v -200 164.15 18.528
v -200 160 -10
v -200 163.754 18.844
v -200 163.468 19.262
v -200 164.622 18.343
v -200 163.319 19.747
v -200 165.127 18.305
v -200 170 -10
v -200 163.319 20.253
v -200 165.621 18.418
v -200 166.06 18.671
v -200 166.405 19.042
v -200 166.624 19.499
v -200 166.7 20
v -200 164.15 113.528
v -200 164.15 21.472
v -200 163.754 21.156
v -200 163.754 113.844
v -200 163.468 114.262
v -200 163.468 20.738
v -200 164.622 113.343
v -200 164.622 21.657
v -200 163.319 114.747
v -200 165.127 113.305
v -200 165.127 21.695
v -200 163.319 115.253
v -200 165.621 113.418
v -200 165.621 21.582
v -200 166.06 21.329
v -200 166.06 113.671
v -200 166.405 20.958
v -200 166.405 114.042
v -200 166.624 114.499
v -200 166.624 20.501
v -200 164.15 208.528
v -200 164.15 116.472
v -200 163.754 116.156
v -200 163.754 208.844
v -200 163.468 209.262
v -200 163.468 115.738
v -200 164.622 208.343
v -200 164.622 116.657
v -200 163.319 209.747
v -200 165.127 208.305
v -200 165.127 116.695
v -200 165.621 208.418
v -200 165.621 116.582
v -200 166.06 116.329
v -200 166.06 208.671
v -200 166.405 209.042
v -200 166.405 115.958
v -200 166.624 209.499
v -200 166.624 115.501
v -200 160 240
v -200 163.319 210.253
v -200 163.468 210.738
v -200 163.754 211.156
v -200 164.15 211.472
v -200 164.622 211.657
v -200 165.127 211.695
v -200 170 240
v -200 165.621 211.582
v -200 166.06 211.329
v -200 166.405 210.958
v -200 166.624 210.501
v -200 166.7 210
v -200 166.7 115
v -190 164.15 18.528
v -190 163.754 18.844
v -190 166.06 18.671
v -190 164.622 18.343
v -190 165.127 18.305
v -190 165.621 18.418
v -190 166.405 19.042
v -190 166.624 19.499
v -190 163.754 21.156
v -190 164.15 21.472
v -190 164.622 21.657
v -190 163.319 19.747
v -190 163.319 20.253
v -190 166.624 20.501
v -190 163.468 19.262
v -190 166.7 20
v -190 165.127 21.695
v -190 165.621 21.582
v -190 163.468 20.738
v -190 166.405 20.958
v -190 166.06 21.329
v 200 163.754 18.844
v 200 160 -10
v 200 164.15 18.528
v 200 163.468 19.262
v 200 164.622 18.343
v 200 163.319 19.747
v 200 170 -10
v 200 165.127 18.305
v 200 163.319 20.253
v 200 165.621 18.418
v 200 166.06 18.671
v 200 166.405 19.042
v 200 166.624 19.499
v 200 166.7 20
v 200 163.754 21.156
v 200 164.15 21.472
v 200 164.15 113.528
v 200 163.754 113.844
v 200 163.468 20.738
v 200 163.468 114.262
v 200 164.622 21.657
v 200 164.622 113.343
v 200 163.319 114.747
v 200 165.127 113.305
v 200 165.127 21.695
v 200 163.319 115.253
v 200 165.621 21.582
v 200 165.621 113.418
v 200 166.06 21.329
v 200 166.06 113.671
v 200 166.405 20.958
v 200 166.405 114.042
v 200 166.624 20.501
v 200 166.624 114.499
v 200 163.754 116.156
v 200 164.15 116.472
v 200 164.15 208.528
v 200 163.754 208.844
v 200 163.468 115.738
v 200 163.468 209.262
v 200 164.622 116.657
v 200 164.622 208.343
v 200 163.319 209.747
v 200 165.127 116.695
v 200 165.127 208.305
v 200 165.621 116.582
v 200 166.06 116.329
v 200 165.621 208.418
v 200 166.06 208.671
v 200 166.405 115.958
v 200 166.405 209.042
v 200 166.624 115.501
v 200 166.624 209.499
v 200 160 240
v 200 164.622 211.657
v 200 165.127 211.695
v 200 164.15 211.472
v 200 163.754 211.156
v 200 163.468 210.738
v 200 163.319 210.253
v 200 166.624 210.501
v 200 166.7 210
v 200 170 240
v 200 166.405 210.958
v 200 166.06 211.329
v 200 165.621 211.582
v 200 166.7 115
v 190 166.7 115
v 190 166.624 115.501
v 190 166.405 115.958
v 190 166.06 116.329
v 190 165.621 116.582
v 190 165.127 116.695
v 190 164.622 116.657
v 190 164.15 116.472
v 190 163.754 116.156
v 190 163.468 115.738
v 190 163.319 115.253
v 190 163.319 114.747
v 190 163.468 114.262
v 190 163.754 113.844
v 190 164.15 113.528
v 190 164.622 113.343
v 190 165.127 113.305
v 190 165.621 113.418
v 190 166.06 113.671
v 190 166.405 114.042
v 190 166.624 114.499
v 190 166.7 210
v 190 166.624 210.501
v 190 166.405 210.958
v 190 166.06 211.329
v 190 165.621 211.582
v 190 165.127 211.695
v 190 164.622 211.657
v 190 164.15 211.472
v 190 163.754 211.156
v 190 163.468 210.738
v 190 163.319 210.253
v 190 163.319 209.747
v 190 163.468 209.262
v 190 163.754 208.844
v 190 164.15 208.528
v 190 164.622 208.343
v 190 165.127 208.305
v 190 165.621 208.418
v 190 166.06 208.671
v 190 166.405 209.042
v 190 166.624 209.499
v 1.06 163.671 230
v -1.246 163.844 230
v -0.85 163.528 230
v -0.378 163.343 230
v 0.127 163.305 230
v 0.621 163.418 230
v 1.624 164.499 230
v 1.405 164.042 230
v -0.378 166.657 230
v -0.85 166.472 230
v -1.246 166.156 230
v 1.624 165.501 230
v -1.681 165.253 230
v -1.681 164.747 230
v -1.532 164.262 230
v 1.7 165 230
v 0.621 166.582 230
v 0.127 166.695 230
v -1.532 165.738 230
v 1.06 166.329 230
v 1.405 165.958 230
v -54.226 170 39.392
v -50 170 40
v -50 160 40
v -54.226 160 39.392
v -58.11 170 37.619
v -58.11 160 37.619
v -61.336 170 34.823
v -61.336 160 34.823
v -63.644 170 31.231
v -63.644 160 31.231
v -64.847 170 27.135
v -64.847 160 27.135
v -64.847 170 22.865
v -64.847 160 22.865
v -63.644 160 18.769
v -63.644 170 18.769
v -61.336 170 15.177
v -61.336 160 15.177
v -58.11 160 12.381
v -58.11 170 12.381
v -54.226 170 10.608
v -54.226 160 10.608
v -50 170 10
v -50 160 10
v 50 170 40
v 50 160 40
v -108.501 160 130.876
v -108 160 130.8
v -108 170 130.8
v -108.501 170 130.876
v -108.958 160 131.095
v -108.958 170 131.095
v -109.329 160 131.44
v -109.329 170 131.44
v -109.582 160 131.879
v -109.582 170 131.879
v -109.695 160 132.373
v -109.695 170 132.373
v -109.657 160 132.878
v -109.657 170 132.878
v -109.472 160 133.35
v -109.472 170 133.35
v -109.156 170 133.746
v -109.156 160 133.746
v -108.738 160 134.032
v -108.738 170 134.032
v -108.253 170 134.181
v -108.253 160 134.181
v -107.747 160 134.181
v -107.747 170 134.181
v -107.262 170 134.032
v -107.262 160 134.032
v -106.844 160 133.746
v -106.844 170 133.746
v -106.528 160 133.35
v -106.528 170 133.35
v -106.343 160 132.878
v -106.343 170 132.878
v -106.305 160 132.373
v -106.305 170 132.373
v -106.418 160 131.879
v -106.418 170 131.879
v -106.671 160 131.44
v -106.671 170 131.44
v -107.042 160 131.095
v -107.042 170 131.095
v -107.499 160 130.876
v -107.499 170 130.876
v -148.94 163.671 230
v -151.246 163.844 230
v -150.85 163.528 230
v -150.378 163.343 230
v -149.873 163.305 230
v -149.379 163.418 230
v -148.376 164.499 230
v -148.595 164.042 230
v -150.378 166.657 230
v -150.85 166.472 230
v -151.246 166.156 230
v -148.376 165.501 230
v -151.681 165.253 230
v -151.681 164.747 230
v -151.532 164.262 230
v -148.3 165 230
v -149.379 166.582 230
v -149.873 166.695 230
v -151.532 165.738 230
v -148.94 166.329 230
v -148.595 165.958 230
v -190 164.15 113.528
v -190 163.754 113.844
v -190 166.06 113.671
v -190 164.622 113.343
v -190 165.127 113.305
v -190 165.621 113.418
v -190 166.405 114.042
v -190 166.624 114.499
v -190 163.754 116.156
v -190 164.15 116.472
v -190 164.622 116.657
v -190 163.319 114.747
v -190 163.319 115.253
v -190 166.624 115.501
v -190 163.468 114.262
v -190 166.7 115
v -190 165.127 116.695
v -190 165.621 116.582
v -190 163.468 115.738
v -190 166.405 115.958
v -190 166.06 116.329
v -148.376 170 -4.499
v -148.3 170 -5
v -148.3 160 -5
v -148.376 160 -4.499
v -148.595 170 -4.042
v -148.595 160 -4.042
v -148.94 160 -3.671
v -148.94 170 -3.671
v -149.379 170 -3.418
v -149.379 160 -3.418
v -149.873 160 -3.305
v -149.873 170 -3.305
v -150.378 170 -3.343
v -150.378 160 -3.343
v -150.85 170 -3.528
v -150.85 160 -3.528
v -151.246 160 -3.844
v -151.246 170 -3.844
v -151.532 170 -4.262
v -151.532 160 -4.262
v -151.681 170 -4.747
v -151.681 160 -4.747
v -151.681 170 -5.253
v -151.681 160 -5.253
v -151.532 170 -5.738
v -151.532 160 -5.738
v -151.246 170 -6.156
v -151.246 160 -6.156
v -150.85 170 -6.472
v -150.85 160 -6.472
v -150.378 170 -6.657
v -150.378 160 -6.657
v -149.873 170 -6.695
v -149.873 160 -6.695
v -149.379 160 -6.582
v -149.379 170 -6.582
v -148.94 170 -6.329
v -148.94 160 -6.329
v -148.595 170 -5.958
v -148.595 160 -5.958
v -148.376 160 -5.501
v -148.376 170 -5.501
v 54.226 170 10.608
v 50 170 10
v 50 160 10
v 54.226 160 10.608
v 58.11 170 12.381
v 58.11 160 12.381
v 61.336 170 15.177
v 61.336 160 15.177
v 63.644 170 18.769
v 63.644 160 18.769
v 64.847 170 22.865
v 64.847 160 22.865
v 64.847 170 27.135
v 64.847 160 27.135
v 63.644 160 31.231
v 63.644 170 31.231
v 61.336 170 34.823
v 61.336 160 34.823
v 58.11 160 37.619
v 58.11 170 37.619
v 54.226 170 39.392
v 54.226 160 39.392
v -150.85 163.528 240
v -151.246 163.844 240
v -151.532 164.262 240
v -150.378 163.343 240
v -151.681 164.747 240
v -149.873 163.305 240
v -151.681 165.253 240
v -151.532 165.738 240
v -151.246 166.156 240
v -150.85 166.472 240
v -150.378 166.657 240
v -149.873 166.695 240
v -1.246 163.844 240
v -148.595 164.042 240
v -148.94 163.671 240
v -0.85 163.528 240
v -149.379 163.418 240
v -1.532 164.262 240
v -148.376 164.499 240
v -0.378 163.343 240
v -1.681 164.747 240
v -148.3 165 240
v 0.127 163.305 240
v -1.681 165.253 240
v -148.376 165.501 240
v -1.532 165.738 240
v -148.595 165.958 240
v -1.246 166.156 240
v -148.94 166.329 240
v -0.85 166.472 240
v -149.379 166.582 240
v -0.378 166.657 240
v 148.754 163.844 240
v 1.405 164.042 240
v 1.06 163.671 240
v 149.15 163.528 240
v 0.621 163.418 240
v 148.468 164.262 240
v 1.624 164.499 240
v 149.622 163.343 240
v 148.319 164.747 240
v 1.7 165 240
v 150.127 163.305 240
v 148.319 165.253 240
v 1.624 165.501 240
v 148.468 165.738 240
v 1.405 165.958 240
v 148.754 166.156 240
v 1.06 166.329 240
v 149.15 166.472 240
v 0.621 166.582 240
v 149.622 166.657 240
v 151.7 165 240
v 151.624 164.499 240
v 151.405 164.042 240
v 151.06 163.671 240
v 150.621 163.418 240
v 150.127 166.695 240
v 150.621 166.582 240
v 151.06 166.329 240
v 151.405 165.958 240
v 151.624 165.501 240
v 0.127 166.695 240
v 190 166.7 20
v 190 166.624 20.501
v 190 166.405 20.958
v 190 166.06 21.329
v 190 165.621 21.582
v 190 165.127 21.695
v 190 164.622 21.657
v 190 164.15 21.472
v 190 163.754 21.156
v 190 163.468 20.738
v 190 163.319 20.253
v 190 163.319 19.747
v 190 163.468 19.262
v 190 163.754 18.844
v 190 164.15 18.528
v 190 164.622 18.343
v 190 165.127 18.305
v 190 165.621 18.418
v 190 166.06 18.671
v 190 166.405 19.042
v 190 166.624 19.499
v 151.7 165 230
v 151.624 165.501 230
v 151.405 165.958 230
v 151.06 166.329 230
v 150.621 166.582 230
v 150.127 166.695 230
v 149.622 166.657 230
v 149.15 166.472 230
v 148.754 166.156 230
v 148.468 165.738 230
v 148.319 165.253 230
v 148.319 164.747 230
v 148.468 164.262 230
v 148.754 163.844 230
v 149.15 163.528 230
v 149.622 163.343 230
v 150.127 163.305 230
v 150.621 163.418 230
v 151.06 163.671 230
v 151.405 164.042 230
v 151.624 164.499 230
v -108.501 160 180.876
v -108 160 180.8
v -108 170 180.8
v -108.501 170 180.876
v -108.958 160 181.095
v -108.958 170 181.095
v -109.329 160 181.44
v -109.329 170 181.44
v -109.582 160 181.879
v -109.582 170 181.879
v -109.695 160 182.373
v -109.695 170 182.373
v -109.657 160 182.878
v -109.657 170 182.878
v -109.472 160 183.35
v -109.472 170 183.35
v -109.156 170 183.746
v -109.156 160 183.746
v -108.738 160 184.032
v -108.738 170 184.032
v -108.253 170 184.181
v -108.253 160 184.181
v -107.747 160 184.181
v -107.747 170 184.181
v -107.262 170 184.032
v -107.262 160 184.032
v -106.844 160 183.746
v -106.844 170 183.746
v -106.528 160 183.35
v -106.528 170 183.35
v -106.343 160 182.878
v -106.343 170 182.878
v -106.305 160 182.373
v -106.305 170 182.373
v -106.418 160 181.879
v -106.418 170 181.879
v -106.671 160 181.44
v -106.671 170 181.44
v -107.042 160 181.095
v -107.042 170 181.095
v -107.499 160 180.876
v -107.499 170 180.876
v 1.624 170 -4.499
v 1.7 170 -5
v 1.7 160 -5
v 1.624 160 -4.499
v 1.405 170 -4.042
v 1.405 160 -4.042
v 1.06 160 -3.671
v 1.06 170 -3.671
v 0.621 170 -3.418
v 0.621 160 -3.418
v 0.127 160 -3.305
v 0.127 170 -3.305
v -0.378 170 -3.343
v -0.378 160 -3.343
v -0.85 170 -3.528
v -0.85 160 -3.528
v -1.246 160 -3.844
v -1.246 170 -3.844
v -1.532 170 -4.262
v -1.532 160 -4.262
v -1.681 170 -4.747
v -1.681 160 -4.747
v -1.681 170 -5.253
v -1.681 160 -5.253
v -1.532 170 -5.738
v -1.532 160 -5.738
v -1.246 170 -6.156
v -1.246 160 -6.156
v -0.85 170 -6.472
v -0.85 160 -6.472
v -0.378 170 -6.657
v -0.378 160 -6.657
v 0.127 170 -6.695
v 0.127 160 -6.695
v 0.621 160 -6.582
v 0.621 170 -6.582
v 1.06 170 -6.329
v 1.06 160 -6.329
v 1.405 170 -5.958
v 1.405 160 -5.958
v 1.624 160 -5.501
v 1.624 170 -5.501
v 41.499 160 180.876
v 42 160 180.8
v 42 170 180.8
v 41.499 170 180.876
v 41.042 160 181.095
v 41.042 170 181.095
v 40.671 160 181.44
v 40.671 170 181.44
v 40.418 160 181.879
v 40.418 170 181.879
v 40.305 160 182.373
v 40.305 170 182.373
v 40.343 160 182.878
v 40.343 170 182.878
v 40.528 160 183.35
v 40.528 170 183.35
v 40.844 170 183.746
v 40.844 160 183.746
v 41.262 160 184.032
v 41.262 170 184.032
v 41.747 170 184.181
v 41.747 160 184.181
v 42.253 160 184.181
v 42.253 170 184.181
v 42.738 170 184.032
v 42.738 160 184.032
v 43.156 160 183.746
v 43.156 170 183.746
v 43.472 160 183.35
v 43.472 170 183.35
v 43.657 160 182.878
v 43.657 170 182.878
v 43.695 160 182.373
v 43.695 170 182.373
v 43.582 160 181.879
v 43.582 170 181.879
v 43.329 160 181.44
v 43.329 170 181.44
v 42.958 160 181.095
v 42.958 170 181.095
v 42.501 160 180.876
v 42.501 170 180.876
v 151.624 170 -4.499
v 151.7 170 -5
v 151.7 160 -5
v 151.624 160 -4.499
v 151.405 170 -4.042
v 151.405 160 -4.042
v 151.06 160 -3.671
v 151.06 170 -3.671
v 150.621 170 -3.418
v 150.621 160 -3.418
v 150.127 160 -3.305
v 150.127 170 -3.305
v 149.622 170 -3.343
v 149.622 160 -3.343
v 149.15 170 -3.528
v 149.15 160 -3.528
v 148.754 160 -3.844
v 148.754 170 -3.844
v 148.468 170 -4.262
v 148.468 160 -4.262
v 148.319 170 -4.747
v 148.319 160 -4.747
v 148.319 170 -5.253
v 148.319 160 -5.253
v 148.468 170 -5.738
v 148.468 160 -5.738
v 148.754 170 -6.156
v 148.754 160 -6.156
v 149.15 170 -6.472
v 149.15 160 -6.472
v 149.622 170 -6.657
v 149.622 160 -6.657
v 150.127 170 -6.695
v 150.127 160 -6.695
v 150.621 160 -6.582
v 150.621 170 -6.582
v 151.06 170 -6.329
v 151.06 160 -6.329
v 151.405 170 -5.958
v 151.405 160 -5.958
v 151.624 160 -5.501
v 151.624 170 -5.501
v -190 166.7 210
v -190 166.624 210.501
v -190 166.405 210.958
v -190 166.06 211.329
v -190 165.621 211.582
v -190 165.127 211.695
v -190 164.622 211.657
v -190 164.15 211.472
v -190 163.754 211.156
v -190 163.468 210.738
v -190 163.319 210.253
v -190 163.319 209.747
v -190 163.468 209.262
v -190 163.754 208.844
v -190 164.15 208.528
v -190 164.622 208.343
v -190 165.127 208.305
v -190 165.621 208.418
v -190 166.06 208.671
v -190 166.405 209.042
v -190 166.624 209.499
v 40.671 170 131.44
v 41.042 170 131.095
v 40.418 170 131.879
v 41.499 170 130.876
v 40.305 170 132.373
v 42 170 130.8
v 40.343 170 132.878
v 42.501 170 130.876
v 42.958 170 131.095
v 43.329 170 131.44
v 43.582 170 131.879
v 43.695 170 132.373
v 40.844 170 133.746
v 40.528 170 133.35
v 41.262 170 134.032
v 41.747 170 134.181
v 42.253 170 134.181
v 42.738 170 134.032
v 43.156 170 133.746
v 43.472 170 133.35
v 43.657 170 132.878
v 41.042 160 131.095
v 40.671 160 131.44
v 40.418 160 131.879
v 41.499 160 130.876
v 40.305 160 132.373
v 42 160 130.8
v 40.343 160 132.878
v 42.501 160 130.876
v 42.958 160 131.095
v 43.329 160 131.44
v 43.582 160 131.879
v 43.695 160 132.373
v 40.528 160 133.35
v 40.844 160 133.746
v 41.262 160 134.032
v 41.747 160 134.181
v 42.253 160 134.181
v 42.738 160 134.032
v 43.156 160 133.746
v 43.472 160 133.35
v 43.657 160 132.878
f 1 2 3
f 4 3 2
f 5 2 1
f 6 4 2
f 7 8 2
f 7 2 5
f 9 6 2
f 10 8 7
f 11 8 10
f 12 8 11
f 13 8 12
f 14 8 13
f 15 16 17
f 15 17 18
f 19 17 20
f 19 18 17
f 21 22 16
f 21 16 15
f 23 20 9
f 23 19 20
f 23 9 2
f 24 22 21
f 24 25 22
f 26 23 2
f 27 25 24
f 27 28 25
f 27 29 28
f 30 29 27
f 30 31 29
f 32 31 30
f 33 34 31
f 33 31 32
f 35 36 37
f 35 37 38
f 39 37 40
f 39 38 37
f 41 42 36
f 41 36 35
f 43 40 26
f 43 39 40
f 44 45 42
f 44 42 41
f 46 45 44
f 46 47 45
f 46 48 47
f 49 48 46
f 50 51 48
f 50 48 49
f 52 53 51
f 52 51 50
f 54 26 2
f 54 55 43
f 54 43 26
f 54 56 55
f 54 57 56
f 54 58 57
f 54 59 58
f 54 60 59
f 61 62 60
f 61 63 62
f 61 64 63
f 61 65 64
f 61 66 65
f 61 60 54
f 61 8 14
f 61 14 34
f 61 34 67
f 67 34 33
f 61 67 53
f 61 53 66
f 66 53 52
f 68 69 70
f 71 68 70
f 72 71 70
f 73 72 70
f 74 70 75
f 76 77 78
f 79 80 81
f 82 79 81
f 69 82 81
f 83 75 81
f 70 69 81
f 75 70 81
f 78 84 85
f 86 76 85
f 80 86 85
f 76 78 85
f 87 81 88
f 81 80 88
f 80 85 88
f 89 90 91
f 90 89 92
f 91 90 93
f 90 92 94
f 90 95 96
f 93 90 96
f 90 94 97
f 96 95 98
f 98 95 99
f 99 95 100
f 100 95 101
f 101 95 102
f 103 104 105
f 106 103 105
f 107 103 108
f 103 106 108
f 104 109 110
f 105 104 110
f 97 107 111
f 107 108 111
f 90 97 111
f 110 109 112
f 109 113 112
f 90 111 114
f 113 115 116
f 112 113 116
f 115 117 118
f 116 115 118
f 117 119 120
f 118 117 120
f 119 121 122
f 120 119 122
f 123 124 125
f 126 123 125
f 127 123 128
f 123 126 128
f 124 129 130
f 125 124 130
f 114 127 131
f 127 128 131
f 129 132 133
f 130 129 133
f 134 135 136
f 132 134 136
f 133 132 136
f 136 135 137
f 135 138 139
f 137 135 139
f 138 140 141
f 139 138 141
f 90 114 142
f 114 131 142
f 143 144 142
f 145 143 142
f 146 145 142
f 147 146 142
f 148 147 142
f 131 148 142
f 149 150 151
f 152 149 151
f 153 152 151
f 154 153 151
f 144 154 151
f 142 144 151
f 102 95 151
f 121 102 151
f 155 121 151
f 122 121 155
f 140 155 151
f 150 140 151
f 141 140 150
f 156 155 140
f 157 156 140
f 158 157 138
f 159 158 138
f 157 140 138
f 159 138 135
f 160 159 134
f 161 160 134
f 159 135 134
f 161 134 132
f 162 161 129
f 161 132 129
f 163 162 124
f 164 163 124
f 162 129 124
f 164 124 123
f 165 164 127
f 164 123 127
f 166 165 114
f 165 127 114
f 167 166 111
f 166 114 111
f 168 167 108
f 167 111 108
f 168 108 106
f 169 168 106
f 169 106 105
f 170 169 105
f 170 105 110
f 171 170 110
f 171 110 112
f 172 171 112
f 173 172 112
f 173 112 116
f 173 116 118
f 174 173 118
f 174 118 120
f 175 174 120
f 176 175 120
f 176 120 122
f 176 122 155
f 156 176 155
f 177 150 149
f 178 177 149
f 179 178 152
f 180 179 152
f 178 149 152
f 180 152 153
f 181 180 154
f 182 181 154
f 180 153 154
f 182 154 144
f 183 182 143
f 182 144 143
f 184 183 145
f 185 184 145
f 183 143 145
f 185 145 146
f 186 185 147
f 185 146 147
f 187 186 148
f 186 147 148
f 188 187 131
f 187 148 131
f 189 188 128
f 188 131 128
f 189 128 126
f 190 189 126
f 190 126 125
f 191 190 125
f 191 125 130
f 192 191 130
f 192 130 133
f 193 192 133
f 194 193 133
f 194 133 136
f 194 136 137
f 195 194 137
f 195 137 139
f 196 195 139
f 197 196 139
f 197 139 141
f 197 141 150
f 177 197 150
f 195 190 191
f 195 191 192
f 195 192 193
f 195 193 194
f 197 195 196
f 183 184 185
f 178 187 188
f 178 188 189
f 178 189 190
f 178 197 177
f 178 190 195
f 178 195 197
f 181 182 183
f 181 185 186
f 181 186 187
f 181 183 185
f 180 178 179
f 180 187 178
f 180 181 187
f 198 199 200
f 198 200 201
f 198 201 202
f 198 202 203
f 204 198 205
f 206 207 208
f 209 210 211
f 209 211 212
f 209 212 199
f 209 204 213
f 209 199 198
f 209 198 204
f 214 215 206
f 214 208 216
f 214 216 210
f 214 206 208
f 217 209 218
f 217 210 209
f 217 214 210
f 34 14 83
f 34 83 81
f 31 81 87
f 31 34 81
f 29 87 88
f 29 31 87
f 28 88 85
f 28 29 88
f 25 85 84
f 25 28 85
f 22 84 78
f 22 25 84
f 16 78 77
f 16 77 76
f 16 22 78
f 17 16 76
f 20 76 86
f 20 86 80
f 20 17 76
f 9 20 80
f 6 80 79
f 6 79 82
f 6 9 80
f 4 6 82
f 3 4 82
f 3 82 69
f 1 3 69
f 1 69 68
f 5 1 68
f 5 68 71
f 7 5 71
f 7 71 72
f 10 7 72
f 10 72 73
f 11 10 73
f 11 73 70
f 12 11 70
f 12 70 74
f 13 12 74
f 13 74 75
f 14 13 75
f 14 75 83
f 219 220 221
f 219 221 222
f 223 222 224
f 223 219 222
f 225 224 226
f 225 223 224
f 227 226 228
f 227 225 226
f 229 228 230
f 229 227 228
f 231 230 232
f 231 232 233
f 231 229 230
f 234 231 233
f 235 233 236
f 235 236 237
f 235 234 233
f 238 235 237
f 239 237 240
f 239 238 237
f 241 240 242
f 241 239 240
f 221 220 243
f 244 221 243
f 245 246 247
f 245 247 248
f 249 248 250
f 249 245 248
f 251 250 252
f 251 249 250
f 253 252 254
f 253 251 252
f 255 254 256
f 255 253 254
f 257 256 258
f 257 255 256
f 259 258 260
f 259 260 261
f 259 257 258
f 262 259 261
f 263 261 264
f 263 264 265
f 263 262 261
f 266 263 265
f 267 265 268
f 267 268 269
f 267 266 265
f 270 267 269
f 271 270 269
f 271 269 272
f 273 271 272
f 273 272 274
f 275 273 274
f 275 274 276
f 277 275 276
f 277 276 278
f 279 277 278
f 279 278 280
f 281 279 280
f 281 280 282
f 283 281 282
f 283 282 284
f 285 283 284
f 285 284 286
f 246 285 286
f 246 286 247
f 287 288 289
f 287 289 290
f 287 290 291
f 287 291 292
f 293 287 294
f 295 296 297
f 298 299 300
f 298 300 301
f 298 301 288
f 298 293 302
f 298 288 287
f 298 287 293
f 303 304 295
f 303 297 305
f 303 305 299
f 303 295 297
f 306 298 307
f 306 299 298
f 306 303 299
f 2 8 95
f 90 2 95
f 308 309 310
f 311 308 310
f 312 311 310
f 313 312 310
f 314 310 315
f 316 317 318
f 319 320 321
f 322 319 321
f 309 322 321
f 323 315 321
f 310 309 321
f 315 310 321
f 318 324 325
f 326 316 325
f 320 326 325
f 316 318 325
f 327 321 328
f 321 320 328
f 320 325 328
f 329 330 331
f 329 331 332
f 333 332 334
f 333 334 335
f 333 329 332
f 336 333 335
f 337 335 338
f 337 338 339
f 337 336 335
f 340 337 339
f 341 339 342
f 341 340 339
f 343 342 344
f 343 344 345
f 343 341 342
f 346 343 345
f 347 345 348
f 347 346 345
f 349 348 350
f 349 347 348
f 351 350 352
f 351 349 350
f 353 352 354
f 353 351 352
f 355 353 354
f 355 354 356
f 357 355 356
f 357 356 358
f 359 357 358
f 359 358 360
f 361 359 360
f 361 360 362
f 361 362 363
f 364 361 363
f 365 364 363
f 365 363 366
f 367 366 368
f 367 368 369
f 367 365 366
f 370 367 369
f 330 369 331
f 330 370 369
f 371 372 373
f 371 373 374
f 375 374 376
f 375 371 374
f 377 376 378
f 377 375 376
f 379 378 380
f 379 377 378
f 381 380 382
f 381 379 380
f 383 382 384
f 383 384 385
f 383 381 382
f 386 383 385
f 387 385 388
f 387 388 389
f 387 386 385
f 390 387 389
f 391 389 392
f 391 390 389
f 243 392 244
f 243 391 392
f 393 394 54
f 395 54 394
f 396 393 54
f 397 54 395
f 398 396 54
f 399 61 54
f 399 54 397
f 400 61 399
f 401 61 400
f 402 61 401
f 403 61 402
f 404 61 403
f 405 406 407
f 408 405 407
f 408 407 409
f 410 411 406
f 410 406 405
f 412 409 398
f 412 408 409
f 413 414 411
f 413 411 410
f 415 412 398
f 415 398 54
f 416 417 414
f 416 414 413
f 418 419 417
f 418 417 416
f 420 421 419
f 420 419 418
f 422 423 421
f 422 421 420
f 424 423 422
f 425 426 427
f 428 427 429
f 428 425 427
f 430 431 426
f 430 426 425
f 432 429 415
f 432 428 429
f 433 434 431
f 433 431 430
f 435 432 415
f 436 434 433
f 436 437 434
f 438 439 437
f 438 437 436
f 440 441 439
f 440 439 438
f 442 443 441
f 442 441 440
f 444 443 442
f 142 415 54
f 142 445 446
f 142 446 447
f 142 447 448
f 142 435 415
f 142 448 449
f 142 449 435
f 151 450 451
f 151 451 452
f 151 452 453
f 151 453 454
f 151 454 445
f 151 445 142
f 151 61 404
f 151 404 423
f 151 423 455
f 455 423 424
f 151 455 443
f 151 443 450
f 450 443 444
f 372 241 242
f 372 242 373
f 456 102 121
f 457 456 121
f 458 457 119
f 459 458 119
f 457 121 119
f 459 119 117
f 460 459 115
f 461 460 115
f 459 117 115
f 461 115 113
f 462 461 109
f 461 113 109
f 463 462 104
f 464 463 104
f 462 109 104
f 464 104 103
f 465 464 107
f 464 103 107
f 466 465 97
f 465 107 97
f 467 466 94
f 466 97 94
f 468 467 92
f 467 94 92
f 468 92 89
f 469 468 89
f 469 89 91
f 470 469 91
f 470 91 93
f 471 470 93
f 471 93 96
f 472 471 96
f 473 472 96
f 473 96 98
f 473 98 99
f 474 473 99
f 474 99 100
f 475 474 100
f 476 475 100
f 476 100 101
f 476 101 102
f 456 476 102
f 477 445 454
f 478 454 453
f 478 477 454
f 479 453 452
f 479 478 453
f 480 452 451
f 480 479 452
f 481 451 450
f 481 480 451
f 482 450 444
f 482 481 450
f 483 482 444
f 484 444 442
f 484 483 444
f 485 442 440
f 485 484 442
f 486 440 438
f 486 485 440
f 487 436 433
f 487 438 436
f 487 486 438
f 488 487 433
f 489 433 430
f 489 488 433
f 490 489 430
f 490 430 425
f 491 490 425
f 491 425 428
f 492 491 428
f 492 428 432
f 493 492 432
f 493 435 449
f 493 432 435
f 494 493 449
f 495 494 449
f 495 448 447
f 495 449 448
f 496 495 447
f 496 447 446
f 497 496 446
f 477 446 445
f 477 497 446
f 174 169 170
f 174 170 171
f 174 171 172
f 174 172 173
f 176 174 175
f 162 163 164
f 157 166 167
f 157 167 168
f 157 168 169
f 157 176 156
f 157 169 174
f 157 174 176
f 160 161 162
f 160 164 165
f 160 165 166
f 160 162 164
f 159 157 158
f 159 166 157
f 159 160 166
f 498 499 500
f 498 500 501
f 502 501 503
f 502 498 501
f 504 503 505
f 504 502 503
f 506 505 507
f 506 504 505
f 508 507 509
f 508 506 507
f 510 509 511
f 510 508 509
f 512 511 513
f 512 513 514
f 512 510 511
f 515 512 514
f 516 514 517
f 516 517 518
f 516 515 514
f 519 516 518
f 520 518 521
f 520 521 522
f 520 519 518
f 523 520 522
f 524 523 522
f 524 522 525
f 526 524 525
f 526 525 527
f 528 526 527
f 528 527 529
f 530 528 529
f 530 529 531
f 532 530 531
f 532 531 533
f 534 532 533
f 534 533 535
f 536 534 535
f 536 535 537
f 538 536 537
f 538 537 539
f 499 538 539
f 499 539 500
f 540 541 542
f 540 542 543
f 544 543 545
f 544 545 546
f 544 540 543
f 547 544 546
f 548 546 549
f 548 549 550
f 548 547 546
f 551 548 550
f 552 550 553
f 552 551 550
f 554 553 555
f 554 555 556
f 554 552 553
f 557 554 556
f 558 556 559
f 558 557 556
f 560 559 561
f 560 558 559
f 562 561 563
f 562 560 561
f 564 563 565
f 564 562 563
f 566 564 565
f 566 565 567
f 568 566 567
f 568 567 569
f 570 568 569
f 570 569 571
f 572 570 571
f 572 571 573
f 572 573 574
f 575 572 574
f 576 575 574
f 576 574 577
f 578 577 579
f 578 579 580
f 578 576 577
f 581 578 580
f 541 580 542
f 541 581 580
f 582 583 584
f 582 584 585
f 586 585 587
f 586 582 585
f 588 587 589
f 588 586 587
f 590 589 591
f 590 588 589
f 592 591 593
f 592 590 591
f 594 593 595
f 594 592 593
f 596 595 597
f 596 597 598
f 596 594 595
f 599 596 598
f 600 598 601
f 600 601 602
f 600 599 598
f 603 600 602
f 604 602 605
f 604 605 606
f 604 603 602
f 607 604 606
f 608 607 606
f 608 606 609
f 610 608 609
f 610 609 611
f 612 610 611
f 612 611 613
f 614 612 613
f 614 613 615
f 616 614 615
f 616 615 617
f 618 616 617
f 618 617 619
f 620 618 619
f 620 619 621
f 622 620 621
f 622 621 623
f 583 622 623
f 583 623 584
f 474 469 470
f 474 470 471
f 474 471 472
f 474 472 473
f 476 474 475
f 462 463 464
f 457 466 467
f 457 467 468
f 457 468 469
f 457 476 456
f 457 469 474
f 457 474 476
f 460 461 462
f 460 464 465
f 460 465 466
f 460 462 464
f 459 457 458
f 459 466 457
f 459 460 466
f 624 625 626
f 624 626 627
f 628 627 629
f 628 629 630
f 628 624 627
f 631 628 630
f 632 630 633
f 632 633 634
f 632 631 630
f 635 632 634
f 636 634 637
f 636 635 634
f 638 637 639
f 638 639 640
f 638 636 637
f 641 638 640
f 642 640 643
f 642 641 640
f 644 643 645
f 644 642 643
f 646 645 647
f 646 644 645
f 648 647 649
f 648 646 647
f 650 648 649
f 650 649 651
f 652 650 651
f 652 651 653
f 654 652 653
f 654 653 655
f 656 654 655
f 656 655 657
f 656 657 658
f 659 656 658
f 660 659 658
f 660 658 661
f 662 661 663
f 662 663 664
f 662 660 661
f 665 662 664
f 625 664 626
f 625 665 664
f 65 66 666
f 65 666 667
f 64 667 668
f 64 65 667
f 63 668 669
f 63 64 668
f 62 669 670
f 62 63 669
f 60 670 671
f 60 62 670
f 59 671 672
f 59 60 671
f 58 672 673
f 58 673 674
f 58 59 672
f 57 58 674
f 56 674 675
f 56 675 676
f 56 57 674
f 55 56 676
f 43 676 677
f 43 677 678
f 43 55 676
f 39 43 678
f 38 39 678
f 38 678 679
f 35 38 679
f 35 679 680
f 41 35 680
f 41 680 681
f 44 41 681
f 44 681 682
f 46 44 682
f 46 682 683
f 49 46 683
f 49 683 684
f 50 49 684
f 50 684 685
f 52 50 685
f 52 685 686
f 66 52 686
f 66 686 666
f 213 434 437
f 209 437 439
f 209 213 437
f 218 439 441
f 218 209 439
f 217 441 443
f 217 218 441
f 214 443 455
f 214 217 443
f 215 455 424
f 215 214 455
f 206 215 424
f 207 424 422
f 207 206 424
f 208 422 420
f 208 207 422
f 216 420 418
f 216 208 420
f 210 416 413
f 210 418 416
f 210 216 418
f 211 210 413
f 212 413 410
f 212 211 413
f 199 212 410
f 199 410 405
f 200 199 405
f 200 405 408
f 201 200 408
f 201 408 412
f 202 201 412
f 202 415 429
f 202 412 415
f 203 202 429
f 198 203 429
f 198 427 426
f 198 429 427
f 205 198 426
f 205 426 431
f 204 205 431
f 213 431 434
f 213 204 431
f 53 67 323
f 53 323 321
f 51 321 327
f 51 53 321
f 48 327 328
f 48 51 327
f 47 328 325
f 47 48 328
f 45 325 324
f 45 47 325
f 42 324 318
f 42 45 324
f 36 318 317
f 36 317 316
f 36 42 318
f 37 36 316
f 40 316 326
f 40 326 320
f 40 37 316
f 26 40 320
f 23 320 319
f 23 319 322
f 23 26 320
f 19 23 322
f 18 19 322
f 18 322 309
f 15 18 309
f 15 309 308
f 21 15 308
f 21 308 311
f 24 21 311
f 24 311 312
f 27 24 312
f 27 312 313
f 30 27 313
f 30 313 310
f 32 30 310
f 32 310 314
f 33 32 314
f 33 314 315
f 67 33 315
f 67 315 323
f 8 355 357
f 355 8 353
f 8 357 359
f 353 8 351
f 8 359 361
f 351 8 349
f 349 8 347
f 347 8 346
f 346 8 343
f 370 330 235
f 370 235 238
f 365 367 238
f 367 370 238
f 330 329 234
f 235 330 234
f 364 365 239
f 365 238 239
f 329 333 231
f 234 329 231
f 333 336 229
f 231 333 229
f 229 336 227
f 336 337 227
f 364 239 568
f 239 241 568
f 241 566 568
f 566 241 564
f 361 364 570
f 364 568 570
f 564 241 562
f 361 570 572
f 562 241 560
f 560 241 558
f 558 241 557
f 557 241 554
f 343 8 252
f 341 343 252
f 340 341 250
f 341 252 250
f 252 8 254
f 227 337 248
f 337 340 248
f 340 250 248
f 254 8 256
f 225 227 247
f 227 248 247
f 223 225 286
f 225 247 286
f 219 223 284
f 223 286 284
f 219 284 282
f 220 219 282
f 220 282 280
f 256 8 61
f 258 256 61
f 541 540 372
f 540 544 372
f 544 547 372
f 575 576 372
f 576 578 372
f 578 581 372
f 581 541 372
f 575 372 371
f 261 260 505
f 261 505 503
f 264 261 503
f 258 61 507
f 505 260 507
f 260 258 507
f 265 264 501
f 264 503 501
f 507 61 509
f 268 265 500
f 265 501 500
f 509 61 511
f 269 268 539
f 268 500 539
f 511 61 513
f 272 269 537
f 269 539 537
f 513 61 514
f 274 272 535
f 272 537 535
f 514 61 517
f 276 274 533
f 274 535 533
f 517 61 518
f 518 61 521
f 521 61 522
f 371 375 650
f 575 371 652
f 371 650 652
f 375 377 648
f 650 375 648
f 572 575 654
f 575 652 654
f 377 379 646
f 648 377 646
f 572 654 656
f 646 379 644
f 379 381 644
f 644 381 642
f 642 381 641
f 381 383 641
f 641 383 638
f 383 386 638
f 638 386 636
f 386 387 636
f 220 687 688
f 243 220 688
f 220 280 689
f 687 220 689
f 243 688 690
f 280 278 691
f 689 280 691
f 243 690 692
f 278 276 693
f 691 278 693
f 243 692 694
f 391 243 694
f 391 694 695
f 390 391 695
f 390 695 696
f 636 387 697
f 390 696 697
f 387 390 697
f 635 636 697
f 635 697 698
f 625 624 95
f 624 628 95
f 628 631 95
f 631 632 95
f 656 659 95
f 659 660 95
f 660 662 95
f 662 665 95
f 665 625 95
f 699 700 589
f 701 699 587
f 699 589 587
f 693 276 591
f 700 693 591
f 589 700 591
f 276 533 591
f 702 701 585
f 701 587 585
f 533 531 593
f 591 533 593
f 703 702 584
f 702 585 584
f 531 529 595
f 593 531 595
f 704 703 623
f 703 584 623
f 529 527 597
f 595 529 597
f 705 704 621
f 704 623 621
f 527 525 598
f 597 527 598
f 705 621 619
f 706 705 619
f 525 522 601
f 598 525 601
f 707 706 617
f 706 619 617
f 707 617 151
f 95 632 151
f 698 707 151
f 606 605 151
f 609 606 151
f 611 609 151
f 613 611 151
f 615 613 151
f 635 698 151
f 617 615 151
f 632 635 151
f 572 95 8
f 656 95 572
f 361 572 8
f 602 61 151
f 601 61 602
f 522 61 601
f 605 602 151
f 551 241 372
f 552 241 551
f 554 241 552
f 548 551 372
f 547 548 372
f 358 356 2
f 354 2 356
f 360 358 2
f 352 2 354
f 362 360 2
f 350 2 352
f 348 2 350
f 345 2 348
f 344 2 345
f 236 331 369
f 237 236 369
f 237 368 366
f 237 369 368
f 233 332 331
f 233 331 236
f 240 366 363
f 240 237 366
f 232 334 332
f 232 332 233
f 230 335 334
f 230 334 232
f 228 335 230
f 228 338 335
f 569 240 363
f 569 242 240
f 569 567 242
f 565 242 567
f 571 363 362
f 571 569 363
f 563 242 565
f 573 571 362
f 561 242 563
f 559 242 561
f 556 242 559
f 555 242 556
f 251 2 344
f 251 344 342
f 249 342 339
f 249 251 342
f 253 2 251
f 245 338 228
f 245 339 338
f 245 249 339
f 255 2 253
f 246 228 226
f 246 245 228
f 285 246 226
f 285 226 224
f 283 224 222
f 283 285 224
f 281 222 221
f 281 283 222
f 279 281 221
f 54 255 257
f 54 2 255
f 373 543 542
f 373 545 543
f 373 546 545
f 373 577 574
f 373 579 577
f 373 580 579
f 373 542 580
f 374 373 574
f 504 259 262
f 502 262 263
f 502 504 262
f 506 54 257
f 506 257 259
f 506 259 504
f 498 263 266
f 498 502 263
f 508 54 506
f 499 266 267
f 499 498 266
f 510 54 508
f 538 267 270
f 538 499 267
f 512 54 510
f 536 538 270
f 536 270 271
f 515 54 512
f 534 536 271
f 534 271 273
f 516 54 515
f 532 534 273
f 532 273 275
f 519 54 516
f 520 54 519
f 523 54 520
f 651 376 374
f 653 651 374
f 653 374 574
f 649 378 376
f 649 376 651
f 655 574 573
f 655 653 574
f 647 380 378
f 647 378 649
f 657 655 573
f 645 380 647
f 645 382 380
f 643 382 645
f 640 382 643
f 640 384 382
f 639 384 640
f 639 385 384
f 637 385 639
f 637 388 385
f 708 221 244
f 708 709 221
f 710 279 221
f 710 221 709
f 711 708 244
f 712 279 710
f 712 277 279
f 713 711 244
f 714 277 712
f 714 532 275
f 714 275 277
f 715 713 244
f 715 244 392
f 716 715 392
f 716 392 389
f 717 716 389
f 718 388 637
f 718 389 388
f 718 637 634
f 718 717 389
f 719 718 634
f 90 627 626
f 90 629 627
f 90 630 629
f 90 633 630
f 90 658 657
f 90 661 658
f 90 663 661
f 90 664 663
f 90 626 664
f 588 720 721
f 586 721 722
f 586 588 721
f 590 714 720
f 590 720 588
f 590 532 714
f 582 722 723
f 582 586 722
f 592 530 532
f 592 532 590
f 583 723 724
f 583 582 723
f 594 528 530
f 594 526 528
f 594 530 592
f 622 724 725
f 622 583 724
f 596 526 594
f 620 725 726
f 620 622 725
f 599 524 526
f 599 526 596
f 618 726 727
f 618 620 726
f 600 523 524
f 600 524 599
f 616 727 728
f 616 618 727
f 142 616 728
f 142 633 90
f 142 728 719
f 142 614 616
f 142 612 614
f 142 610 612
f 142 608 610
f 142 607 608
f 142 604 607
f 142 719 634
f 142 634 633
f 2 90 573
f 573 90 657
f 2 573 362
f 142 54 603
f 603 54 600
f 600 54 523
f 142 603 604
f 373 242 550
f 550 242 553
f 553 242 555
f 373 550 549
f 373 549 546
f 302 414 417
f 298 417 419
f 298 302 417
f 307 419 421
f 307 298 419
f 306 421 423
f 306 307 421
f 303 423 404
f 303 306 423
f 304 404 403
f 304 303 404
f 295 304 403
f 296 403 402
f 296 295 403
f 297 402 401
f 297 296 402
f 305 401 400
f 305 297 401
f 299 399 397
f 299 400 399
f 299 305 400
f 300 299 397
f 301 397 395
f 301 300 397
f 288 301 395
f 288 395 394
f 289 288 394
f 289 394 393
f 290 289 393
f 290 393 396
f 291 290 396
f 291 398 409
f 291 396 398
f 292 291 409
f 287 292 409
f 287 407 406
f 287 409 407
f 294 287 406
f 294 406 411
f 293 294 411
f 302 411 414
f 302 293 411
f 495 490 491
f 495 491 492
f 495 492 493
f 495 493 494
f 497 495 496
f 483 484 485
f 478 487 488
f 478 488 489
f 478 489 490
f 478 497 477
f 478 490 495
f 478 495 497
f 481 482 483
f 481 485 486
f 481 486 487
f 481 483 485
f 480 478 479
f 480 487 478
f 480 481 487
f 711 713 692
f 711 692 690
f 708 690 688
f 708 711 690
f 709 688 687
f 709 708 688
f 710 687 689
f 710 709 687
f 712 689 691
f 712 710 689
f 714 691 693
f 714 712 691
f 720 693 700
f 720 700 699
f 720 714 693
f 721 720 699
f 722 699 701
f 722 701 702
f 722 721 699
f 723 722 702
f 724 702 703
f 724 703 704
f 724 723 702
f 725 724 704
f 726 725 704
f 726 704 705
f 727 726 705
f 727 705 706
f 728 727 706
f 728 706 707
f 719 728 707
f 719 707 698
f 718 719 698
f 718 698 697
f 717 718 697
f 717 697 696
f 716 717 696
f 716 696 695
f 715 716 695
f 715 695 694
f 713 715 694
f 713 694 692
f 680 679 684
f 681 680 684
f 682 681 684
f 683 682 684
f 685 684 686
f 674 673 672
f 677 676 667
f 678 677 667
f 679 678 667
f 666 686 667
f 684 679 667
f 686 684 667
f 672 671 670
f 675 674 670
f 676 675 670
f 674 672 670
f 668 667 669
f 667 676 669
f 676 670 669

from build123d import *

# Parameters (mm, degrees)
SKETCH021_R               = 1.7
PAD019_DEPTH              = 20
SKETCH020_R               = 1.7
PAD018_DEPTH              = 20
SKETCH019_R               = 1.7
PAD017_DEPTH              = 20
CYLINDER038_R             = 1.7
CYLINDER038_DEPTH         = 61
CYLINDER038_PITCH_ANGLE   = 90
CYLINDER037_R             = 1.7
CYLINDER037_DEPTH         = 61
CYLINDER037_PITCH_ANGLE   = 90
CYLINDER036_R             = 1.7
CYLINDER036_DEPTH         = 61
CYLINDER036_PITCH_ANGLE   = 90
BOX001_W                  = 50
BOX001_H                  = 215
BOX001_DEPTH              = 115
CYLINDER039_R             = 1.7
CYLINDER039_DEPTH         = 61
CYLINDER039_PITCH_ANGLE   = 90
FUSION011_PLACEMENT_ANGLE = 90
SKETCH003_W               = 400
SKETCH003_H               = 250
SKETCH003_R               = 1.7
PAD003_DEPTH              = 10


with BuildPart() as pad019:
    # Sketch021 → Pad019 (new body)
    with BuildSketch(Plane(origin=(0, -75, 230), x_dir=(1, 0, 0), z_dir=(0, 0, 1))):
        with Locations((-150, 240)):
            Circle(SKETCH021_R)
        with Locations((150, 240)):
            Circle(SKETCH021_R)
        with Locations((0, 240)):
            Circle(SKETCH021_R)
    extrude(amount=PAD019_DEPTH)


with BuildPart() as pad018:
    # Sketch020 → Pad018 (new body)
    with BuildSketch(Plane.YZ.offset(-210)):
        with Locations((165, 210)):
            Circle(SKETCH020_R)
        with Locations((165, 115)):
            Circle(SKETCH020_R)
        with Locations((165, 20)):
            Circle(SKETCH020_R)
    extrude(amount=PAD018_DEPTH)


with BuildPart() as fusion013:
    # Sketch019 → Pad017 (new body)
    with BuildSketch(Plane.YZ.offset(210)):
        with Locations((165, 210)):
            Circle(SKETCH019_R)
        with Locations((165, 115)):
            Circle(SKETCH019_R)
        with Locations((165, 20)):
            Circle(SKETCH019_R)
    extrude(amount=-PAD017_DEPTH)

    # Fusion012: union Pad018
    add(pad018.part)

    # Fusion013: union Pad019
    add(pad019.part)


with BuildPart() as cylinder038:
    # Cylinder038 → Cylinder038 (new body)
    with BuildSketch(Plane.XY):
        Circle(CYLINDER038_R)
    extrude(amount=CYLINDER038_DEPTH)


with BuildPart() as cylinder038_1:
    # Cylinder038 pitch: moved
    add(cylinder038.part.rotate(Axis((0, 0, 0), (0, 1, 0)), CYLINDER038_PITCH_ANGLE))


with BuildPart() as cylinder038_2:
    # Cylinder038 placement: moved
    add(cylinder038_1.part.moved(Location((150, 112.5, 147.5))))


with BuildPart() as cylinder037:
    # Cylinder037 → Cylinder037 (new body)
    with BuildSketch(Plane.XY):
        Circle(CYLINDER037_R)
    extrude(amount=CYLINDER037_DEPTH)


with BuildPart() as cylinder037_1:
    # Cylinder037 pitch: moved
    add(cylinder037.part.rotate(Axis((0, 0, 0), (0, 1, 0)), CYLINDER037_PITCH_ANGLE))


with BuildPart() as cylinder037_2:
    # Cylinder037 placement: moved
    add(cylinder037_1.part.moved(Location((150, -37.5, 197.5))))


with BuildPart() as cylinder036:
    # Cylinder036 → Cylinder036 (new body)
    with BuildSketch(Plane.XY):
        Circle(CYLINDER036_R)
    extrude(amount=CYLINDER036_DEPTH)


with BuildPart() as cylinder036_1:
    # Cylinder036 pitch: moved
    add(cylinder036.part.rotate(Axis((0, 0, 0), (0, 1, 0)), CYLINDER036_PITCH_ANGLE))


with BuildPart() as cylinder036_2:
    # Cylinder036 placement: moved
    add(cylinder036_1.part.moved(Location((150, -37.5, 147.5))))


with BuildPart() as box001:
    # Box001 → Box001 (new body)
    with BuildSketch(Plane(origin=(150, -70, 115), x_dir=(1, 0, 0), z_dir=(0, 0, 1))):
        with Locations((25, 107.5)):
            Rectangle(BOX001_W, BOX001_H)
    extrude(amount=BOX001_DEPTH)


with BuildPart() as fusion011:
    # Cylinder039 → Cylinder039 (new body)
    with BuildSketch(Plane.XY):
        Circle(CYLINDER039_R)
    extrude(amount=CYLINDER039_DEPTH)


with BuildPart() as fusion011_1:
    # Cylinder039 pitch: moved
    add(fusion011.part.rotate(Axis((0, 0, 0), (0, 1, 0)), CYLINDER039_PITCH_ANGLE))


with BuildPart() as fusion011_2:
    # Cylinder039 placement: moved
    add(fusion011_1.part.moved(Location((150, 112.5, 197.5))))

    # Fusion011: union Cylinder038, Cylinder037, Cylinder036, Box001
    add(cylinder038_2.part)
    add(cylinder037_2.part)
    add(cylinder036_2.part)
    add(box001.part)


with BuildPart() as fusion011_3:
    # Fusion011 placement: moved
    add(fusion011_2.part.moved(Location((4.5, -41, -15))).rotate(Axis((4.5, -41, -15), (0, 0, 1)), FUSION011_PLACEMENT_ANGLE))


with BuildPart() as cut015:
    # Sketch003 → Pad003 (new body)
    with BuildSketch(Plane.XZ.offset(-170)):
        with Locations((0, 115)):
            Rectangle(SKETCH003_W, SKETCH003_H)
        with Locations((0, -5)):
            Circle(SKETCH003_R, mode=Mode.SUBTRACT)
        with Locations((-150, -5)):
            Circle(SKETCH003_R, mode=Mode.SUBTRACT)
        with Locations((150, -5)):
            Circle(SKETCH003_R, mode=Mode.SUBTRACT)
        with BuildLine():
            ThreePointArc((-50, 40), (-65, 25), (-50, 10))
            Line((-50, 10), (50, 10))
            ThreePointArc((50, 10), (65, 25), (50, 40))
            Line((-50, 40), (50, 40))
        make_face(mode=Mode.SUBTRACT)
    extrude(amount=PAD003_DEPTH)

    # Cut014: cut Fusion011
    add(fusion011_3.part, mode=Mode.SUBTRACT)

    # Cut015: cut Fusion013
    add(fusion013.part, mode=Mode.SUBTRACT)


solid = cut015.part
